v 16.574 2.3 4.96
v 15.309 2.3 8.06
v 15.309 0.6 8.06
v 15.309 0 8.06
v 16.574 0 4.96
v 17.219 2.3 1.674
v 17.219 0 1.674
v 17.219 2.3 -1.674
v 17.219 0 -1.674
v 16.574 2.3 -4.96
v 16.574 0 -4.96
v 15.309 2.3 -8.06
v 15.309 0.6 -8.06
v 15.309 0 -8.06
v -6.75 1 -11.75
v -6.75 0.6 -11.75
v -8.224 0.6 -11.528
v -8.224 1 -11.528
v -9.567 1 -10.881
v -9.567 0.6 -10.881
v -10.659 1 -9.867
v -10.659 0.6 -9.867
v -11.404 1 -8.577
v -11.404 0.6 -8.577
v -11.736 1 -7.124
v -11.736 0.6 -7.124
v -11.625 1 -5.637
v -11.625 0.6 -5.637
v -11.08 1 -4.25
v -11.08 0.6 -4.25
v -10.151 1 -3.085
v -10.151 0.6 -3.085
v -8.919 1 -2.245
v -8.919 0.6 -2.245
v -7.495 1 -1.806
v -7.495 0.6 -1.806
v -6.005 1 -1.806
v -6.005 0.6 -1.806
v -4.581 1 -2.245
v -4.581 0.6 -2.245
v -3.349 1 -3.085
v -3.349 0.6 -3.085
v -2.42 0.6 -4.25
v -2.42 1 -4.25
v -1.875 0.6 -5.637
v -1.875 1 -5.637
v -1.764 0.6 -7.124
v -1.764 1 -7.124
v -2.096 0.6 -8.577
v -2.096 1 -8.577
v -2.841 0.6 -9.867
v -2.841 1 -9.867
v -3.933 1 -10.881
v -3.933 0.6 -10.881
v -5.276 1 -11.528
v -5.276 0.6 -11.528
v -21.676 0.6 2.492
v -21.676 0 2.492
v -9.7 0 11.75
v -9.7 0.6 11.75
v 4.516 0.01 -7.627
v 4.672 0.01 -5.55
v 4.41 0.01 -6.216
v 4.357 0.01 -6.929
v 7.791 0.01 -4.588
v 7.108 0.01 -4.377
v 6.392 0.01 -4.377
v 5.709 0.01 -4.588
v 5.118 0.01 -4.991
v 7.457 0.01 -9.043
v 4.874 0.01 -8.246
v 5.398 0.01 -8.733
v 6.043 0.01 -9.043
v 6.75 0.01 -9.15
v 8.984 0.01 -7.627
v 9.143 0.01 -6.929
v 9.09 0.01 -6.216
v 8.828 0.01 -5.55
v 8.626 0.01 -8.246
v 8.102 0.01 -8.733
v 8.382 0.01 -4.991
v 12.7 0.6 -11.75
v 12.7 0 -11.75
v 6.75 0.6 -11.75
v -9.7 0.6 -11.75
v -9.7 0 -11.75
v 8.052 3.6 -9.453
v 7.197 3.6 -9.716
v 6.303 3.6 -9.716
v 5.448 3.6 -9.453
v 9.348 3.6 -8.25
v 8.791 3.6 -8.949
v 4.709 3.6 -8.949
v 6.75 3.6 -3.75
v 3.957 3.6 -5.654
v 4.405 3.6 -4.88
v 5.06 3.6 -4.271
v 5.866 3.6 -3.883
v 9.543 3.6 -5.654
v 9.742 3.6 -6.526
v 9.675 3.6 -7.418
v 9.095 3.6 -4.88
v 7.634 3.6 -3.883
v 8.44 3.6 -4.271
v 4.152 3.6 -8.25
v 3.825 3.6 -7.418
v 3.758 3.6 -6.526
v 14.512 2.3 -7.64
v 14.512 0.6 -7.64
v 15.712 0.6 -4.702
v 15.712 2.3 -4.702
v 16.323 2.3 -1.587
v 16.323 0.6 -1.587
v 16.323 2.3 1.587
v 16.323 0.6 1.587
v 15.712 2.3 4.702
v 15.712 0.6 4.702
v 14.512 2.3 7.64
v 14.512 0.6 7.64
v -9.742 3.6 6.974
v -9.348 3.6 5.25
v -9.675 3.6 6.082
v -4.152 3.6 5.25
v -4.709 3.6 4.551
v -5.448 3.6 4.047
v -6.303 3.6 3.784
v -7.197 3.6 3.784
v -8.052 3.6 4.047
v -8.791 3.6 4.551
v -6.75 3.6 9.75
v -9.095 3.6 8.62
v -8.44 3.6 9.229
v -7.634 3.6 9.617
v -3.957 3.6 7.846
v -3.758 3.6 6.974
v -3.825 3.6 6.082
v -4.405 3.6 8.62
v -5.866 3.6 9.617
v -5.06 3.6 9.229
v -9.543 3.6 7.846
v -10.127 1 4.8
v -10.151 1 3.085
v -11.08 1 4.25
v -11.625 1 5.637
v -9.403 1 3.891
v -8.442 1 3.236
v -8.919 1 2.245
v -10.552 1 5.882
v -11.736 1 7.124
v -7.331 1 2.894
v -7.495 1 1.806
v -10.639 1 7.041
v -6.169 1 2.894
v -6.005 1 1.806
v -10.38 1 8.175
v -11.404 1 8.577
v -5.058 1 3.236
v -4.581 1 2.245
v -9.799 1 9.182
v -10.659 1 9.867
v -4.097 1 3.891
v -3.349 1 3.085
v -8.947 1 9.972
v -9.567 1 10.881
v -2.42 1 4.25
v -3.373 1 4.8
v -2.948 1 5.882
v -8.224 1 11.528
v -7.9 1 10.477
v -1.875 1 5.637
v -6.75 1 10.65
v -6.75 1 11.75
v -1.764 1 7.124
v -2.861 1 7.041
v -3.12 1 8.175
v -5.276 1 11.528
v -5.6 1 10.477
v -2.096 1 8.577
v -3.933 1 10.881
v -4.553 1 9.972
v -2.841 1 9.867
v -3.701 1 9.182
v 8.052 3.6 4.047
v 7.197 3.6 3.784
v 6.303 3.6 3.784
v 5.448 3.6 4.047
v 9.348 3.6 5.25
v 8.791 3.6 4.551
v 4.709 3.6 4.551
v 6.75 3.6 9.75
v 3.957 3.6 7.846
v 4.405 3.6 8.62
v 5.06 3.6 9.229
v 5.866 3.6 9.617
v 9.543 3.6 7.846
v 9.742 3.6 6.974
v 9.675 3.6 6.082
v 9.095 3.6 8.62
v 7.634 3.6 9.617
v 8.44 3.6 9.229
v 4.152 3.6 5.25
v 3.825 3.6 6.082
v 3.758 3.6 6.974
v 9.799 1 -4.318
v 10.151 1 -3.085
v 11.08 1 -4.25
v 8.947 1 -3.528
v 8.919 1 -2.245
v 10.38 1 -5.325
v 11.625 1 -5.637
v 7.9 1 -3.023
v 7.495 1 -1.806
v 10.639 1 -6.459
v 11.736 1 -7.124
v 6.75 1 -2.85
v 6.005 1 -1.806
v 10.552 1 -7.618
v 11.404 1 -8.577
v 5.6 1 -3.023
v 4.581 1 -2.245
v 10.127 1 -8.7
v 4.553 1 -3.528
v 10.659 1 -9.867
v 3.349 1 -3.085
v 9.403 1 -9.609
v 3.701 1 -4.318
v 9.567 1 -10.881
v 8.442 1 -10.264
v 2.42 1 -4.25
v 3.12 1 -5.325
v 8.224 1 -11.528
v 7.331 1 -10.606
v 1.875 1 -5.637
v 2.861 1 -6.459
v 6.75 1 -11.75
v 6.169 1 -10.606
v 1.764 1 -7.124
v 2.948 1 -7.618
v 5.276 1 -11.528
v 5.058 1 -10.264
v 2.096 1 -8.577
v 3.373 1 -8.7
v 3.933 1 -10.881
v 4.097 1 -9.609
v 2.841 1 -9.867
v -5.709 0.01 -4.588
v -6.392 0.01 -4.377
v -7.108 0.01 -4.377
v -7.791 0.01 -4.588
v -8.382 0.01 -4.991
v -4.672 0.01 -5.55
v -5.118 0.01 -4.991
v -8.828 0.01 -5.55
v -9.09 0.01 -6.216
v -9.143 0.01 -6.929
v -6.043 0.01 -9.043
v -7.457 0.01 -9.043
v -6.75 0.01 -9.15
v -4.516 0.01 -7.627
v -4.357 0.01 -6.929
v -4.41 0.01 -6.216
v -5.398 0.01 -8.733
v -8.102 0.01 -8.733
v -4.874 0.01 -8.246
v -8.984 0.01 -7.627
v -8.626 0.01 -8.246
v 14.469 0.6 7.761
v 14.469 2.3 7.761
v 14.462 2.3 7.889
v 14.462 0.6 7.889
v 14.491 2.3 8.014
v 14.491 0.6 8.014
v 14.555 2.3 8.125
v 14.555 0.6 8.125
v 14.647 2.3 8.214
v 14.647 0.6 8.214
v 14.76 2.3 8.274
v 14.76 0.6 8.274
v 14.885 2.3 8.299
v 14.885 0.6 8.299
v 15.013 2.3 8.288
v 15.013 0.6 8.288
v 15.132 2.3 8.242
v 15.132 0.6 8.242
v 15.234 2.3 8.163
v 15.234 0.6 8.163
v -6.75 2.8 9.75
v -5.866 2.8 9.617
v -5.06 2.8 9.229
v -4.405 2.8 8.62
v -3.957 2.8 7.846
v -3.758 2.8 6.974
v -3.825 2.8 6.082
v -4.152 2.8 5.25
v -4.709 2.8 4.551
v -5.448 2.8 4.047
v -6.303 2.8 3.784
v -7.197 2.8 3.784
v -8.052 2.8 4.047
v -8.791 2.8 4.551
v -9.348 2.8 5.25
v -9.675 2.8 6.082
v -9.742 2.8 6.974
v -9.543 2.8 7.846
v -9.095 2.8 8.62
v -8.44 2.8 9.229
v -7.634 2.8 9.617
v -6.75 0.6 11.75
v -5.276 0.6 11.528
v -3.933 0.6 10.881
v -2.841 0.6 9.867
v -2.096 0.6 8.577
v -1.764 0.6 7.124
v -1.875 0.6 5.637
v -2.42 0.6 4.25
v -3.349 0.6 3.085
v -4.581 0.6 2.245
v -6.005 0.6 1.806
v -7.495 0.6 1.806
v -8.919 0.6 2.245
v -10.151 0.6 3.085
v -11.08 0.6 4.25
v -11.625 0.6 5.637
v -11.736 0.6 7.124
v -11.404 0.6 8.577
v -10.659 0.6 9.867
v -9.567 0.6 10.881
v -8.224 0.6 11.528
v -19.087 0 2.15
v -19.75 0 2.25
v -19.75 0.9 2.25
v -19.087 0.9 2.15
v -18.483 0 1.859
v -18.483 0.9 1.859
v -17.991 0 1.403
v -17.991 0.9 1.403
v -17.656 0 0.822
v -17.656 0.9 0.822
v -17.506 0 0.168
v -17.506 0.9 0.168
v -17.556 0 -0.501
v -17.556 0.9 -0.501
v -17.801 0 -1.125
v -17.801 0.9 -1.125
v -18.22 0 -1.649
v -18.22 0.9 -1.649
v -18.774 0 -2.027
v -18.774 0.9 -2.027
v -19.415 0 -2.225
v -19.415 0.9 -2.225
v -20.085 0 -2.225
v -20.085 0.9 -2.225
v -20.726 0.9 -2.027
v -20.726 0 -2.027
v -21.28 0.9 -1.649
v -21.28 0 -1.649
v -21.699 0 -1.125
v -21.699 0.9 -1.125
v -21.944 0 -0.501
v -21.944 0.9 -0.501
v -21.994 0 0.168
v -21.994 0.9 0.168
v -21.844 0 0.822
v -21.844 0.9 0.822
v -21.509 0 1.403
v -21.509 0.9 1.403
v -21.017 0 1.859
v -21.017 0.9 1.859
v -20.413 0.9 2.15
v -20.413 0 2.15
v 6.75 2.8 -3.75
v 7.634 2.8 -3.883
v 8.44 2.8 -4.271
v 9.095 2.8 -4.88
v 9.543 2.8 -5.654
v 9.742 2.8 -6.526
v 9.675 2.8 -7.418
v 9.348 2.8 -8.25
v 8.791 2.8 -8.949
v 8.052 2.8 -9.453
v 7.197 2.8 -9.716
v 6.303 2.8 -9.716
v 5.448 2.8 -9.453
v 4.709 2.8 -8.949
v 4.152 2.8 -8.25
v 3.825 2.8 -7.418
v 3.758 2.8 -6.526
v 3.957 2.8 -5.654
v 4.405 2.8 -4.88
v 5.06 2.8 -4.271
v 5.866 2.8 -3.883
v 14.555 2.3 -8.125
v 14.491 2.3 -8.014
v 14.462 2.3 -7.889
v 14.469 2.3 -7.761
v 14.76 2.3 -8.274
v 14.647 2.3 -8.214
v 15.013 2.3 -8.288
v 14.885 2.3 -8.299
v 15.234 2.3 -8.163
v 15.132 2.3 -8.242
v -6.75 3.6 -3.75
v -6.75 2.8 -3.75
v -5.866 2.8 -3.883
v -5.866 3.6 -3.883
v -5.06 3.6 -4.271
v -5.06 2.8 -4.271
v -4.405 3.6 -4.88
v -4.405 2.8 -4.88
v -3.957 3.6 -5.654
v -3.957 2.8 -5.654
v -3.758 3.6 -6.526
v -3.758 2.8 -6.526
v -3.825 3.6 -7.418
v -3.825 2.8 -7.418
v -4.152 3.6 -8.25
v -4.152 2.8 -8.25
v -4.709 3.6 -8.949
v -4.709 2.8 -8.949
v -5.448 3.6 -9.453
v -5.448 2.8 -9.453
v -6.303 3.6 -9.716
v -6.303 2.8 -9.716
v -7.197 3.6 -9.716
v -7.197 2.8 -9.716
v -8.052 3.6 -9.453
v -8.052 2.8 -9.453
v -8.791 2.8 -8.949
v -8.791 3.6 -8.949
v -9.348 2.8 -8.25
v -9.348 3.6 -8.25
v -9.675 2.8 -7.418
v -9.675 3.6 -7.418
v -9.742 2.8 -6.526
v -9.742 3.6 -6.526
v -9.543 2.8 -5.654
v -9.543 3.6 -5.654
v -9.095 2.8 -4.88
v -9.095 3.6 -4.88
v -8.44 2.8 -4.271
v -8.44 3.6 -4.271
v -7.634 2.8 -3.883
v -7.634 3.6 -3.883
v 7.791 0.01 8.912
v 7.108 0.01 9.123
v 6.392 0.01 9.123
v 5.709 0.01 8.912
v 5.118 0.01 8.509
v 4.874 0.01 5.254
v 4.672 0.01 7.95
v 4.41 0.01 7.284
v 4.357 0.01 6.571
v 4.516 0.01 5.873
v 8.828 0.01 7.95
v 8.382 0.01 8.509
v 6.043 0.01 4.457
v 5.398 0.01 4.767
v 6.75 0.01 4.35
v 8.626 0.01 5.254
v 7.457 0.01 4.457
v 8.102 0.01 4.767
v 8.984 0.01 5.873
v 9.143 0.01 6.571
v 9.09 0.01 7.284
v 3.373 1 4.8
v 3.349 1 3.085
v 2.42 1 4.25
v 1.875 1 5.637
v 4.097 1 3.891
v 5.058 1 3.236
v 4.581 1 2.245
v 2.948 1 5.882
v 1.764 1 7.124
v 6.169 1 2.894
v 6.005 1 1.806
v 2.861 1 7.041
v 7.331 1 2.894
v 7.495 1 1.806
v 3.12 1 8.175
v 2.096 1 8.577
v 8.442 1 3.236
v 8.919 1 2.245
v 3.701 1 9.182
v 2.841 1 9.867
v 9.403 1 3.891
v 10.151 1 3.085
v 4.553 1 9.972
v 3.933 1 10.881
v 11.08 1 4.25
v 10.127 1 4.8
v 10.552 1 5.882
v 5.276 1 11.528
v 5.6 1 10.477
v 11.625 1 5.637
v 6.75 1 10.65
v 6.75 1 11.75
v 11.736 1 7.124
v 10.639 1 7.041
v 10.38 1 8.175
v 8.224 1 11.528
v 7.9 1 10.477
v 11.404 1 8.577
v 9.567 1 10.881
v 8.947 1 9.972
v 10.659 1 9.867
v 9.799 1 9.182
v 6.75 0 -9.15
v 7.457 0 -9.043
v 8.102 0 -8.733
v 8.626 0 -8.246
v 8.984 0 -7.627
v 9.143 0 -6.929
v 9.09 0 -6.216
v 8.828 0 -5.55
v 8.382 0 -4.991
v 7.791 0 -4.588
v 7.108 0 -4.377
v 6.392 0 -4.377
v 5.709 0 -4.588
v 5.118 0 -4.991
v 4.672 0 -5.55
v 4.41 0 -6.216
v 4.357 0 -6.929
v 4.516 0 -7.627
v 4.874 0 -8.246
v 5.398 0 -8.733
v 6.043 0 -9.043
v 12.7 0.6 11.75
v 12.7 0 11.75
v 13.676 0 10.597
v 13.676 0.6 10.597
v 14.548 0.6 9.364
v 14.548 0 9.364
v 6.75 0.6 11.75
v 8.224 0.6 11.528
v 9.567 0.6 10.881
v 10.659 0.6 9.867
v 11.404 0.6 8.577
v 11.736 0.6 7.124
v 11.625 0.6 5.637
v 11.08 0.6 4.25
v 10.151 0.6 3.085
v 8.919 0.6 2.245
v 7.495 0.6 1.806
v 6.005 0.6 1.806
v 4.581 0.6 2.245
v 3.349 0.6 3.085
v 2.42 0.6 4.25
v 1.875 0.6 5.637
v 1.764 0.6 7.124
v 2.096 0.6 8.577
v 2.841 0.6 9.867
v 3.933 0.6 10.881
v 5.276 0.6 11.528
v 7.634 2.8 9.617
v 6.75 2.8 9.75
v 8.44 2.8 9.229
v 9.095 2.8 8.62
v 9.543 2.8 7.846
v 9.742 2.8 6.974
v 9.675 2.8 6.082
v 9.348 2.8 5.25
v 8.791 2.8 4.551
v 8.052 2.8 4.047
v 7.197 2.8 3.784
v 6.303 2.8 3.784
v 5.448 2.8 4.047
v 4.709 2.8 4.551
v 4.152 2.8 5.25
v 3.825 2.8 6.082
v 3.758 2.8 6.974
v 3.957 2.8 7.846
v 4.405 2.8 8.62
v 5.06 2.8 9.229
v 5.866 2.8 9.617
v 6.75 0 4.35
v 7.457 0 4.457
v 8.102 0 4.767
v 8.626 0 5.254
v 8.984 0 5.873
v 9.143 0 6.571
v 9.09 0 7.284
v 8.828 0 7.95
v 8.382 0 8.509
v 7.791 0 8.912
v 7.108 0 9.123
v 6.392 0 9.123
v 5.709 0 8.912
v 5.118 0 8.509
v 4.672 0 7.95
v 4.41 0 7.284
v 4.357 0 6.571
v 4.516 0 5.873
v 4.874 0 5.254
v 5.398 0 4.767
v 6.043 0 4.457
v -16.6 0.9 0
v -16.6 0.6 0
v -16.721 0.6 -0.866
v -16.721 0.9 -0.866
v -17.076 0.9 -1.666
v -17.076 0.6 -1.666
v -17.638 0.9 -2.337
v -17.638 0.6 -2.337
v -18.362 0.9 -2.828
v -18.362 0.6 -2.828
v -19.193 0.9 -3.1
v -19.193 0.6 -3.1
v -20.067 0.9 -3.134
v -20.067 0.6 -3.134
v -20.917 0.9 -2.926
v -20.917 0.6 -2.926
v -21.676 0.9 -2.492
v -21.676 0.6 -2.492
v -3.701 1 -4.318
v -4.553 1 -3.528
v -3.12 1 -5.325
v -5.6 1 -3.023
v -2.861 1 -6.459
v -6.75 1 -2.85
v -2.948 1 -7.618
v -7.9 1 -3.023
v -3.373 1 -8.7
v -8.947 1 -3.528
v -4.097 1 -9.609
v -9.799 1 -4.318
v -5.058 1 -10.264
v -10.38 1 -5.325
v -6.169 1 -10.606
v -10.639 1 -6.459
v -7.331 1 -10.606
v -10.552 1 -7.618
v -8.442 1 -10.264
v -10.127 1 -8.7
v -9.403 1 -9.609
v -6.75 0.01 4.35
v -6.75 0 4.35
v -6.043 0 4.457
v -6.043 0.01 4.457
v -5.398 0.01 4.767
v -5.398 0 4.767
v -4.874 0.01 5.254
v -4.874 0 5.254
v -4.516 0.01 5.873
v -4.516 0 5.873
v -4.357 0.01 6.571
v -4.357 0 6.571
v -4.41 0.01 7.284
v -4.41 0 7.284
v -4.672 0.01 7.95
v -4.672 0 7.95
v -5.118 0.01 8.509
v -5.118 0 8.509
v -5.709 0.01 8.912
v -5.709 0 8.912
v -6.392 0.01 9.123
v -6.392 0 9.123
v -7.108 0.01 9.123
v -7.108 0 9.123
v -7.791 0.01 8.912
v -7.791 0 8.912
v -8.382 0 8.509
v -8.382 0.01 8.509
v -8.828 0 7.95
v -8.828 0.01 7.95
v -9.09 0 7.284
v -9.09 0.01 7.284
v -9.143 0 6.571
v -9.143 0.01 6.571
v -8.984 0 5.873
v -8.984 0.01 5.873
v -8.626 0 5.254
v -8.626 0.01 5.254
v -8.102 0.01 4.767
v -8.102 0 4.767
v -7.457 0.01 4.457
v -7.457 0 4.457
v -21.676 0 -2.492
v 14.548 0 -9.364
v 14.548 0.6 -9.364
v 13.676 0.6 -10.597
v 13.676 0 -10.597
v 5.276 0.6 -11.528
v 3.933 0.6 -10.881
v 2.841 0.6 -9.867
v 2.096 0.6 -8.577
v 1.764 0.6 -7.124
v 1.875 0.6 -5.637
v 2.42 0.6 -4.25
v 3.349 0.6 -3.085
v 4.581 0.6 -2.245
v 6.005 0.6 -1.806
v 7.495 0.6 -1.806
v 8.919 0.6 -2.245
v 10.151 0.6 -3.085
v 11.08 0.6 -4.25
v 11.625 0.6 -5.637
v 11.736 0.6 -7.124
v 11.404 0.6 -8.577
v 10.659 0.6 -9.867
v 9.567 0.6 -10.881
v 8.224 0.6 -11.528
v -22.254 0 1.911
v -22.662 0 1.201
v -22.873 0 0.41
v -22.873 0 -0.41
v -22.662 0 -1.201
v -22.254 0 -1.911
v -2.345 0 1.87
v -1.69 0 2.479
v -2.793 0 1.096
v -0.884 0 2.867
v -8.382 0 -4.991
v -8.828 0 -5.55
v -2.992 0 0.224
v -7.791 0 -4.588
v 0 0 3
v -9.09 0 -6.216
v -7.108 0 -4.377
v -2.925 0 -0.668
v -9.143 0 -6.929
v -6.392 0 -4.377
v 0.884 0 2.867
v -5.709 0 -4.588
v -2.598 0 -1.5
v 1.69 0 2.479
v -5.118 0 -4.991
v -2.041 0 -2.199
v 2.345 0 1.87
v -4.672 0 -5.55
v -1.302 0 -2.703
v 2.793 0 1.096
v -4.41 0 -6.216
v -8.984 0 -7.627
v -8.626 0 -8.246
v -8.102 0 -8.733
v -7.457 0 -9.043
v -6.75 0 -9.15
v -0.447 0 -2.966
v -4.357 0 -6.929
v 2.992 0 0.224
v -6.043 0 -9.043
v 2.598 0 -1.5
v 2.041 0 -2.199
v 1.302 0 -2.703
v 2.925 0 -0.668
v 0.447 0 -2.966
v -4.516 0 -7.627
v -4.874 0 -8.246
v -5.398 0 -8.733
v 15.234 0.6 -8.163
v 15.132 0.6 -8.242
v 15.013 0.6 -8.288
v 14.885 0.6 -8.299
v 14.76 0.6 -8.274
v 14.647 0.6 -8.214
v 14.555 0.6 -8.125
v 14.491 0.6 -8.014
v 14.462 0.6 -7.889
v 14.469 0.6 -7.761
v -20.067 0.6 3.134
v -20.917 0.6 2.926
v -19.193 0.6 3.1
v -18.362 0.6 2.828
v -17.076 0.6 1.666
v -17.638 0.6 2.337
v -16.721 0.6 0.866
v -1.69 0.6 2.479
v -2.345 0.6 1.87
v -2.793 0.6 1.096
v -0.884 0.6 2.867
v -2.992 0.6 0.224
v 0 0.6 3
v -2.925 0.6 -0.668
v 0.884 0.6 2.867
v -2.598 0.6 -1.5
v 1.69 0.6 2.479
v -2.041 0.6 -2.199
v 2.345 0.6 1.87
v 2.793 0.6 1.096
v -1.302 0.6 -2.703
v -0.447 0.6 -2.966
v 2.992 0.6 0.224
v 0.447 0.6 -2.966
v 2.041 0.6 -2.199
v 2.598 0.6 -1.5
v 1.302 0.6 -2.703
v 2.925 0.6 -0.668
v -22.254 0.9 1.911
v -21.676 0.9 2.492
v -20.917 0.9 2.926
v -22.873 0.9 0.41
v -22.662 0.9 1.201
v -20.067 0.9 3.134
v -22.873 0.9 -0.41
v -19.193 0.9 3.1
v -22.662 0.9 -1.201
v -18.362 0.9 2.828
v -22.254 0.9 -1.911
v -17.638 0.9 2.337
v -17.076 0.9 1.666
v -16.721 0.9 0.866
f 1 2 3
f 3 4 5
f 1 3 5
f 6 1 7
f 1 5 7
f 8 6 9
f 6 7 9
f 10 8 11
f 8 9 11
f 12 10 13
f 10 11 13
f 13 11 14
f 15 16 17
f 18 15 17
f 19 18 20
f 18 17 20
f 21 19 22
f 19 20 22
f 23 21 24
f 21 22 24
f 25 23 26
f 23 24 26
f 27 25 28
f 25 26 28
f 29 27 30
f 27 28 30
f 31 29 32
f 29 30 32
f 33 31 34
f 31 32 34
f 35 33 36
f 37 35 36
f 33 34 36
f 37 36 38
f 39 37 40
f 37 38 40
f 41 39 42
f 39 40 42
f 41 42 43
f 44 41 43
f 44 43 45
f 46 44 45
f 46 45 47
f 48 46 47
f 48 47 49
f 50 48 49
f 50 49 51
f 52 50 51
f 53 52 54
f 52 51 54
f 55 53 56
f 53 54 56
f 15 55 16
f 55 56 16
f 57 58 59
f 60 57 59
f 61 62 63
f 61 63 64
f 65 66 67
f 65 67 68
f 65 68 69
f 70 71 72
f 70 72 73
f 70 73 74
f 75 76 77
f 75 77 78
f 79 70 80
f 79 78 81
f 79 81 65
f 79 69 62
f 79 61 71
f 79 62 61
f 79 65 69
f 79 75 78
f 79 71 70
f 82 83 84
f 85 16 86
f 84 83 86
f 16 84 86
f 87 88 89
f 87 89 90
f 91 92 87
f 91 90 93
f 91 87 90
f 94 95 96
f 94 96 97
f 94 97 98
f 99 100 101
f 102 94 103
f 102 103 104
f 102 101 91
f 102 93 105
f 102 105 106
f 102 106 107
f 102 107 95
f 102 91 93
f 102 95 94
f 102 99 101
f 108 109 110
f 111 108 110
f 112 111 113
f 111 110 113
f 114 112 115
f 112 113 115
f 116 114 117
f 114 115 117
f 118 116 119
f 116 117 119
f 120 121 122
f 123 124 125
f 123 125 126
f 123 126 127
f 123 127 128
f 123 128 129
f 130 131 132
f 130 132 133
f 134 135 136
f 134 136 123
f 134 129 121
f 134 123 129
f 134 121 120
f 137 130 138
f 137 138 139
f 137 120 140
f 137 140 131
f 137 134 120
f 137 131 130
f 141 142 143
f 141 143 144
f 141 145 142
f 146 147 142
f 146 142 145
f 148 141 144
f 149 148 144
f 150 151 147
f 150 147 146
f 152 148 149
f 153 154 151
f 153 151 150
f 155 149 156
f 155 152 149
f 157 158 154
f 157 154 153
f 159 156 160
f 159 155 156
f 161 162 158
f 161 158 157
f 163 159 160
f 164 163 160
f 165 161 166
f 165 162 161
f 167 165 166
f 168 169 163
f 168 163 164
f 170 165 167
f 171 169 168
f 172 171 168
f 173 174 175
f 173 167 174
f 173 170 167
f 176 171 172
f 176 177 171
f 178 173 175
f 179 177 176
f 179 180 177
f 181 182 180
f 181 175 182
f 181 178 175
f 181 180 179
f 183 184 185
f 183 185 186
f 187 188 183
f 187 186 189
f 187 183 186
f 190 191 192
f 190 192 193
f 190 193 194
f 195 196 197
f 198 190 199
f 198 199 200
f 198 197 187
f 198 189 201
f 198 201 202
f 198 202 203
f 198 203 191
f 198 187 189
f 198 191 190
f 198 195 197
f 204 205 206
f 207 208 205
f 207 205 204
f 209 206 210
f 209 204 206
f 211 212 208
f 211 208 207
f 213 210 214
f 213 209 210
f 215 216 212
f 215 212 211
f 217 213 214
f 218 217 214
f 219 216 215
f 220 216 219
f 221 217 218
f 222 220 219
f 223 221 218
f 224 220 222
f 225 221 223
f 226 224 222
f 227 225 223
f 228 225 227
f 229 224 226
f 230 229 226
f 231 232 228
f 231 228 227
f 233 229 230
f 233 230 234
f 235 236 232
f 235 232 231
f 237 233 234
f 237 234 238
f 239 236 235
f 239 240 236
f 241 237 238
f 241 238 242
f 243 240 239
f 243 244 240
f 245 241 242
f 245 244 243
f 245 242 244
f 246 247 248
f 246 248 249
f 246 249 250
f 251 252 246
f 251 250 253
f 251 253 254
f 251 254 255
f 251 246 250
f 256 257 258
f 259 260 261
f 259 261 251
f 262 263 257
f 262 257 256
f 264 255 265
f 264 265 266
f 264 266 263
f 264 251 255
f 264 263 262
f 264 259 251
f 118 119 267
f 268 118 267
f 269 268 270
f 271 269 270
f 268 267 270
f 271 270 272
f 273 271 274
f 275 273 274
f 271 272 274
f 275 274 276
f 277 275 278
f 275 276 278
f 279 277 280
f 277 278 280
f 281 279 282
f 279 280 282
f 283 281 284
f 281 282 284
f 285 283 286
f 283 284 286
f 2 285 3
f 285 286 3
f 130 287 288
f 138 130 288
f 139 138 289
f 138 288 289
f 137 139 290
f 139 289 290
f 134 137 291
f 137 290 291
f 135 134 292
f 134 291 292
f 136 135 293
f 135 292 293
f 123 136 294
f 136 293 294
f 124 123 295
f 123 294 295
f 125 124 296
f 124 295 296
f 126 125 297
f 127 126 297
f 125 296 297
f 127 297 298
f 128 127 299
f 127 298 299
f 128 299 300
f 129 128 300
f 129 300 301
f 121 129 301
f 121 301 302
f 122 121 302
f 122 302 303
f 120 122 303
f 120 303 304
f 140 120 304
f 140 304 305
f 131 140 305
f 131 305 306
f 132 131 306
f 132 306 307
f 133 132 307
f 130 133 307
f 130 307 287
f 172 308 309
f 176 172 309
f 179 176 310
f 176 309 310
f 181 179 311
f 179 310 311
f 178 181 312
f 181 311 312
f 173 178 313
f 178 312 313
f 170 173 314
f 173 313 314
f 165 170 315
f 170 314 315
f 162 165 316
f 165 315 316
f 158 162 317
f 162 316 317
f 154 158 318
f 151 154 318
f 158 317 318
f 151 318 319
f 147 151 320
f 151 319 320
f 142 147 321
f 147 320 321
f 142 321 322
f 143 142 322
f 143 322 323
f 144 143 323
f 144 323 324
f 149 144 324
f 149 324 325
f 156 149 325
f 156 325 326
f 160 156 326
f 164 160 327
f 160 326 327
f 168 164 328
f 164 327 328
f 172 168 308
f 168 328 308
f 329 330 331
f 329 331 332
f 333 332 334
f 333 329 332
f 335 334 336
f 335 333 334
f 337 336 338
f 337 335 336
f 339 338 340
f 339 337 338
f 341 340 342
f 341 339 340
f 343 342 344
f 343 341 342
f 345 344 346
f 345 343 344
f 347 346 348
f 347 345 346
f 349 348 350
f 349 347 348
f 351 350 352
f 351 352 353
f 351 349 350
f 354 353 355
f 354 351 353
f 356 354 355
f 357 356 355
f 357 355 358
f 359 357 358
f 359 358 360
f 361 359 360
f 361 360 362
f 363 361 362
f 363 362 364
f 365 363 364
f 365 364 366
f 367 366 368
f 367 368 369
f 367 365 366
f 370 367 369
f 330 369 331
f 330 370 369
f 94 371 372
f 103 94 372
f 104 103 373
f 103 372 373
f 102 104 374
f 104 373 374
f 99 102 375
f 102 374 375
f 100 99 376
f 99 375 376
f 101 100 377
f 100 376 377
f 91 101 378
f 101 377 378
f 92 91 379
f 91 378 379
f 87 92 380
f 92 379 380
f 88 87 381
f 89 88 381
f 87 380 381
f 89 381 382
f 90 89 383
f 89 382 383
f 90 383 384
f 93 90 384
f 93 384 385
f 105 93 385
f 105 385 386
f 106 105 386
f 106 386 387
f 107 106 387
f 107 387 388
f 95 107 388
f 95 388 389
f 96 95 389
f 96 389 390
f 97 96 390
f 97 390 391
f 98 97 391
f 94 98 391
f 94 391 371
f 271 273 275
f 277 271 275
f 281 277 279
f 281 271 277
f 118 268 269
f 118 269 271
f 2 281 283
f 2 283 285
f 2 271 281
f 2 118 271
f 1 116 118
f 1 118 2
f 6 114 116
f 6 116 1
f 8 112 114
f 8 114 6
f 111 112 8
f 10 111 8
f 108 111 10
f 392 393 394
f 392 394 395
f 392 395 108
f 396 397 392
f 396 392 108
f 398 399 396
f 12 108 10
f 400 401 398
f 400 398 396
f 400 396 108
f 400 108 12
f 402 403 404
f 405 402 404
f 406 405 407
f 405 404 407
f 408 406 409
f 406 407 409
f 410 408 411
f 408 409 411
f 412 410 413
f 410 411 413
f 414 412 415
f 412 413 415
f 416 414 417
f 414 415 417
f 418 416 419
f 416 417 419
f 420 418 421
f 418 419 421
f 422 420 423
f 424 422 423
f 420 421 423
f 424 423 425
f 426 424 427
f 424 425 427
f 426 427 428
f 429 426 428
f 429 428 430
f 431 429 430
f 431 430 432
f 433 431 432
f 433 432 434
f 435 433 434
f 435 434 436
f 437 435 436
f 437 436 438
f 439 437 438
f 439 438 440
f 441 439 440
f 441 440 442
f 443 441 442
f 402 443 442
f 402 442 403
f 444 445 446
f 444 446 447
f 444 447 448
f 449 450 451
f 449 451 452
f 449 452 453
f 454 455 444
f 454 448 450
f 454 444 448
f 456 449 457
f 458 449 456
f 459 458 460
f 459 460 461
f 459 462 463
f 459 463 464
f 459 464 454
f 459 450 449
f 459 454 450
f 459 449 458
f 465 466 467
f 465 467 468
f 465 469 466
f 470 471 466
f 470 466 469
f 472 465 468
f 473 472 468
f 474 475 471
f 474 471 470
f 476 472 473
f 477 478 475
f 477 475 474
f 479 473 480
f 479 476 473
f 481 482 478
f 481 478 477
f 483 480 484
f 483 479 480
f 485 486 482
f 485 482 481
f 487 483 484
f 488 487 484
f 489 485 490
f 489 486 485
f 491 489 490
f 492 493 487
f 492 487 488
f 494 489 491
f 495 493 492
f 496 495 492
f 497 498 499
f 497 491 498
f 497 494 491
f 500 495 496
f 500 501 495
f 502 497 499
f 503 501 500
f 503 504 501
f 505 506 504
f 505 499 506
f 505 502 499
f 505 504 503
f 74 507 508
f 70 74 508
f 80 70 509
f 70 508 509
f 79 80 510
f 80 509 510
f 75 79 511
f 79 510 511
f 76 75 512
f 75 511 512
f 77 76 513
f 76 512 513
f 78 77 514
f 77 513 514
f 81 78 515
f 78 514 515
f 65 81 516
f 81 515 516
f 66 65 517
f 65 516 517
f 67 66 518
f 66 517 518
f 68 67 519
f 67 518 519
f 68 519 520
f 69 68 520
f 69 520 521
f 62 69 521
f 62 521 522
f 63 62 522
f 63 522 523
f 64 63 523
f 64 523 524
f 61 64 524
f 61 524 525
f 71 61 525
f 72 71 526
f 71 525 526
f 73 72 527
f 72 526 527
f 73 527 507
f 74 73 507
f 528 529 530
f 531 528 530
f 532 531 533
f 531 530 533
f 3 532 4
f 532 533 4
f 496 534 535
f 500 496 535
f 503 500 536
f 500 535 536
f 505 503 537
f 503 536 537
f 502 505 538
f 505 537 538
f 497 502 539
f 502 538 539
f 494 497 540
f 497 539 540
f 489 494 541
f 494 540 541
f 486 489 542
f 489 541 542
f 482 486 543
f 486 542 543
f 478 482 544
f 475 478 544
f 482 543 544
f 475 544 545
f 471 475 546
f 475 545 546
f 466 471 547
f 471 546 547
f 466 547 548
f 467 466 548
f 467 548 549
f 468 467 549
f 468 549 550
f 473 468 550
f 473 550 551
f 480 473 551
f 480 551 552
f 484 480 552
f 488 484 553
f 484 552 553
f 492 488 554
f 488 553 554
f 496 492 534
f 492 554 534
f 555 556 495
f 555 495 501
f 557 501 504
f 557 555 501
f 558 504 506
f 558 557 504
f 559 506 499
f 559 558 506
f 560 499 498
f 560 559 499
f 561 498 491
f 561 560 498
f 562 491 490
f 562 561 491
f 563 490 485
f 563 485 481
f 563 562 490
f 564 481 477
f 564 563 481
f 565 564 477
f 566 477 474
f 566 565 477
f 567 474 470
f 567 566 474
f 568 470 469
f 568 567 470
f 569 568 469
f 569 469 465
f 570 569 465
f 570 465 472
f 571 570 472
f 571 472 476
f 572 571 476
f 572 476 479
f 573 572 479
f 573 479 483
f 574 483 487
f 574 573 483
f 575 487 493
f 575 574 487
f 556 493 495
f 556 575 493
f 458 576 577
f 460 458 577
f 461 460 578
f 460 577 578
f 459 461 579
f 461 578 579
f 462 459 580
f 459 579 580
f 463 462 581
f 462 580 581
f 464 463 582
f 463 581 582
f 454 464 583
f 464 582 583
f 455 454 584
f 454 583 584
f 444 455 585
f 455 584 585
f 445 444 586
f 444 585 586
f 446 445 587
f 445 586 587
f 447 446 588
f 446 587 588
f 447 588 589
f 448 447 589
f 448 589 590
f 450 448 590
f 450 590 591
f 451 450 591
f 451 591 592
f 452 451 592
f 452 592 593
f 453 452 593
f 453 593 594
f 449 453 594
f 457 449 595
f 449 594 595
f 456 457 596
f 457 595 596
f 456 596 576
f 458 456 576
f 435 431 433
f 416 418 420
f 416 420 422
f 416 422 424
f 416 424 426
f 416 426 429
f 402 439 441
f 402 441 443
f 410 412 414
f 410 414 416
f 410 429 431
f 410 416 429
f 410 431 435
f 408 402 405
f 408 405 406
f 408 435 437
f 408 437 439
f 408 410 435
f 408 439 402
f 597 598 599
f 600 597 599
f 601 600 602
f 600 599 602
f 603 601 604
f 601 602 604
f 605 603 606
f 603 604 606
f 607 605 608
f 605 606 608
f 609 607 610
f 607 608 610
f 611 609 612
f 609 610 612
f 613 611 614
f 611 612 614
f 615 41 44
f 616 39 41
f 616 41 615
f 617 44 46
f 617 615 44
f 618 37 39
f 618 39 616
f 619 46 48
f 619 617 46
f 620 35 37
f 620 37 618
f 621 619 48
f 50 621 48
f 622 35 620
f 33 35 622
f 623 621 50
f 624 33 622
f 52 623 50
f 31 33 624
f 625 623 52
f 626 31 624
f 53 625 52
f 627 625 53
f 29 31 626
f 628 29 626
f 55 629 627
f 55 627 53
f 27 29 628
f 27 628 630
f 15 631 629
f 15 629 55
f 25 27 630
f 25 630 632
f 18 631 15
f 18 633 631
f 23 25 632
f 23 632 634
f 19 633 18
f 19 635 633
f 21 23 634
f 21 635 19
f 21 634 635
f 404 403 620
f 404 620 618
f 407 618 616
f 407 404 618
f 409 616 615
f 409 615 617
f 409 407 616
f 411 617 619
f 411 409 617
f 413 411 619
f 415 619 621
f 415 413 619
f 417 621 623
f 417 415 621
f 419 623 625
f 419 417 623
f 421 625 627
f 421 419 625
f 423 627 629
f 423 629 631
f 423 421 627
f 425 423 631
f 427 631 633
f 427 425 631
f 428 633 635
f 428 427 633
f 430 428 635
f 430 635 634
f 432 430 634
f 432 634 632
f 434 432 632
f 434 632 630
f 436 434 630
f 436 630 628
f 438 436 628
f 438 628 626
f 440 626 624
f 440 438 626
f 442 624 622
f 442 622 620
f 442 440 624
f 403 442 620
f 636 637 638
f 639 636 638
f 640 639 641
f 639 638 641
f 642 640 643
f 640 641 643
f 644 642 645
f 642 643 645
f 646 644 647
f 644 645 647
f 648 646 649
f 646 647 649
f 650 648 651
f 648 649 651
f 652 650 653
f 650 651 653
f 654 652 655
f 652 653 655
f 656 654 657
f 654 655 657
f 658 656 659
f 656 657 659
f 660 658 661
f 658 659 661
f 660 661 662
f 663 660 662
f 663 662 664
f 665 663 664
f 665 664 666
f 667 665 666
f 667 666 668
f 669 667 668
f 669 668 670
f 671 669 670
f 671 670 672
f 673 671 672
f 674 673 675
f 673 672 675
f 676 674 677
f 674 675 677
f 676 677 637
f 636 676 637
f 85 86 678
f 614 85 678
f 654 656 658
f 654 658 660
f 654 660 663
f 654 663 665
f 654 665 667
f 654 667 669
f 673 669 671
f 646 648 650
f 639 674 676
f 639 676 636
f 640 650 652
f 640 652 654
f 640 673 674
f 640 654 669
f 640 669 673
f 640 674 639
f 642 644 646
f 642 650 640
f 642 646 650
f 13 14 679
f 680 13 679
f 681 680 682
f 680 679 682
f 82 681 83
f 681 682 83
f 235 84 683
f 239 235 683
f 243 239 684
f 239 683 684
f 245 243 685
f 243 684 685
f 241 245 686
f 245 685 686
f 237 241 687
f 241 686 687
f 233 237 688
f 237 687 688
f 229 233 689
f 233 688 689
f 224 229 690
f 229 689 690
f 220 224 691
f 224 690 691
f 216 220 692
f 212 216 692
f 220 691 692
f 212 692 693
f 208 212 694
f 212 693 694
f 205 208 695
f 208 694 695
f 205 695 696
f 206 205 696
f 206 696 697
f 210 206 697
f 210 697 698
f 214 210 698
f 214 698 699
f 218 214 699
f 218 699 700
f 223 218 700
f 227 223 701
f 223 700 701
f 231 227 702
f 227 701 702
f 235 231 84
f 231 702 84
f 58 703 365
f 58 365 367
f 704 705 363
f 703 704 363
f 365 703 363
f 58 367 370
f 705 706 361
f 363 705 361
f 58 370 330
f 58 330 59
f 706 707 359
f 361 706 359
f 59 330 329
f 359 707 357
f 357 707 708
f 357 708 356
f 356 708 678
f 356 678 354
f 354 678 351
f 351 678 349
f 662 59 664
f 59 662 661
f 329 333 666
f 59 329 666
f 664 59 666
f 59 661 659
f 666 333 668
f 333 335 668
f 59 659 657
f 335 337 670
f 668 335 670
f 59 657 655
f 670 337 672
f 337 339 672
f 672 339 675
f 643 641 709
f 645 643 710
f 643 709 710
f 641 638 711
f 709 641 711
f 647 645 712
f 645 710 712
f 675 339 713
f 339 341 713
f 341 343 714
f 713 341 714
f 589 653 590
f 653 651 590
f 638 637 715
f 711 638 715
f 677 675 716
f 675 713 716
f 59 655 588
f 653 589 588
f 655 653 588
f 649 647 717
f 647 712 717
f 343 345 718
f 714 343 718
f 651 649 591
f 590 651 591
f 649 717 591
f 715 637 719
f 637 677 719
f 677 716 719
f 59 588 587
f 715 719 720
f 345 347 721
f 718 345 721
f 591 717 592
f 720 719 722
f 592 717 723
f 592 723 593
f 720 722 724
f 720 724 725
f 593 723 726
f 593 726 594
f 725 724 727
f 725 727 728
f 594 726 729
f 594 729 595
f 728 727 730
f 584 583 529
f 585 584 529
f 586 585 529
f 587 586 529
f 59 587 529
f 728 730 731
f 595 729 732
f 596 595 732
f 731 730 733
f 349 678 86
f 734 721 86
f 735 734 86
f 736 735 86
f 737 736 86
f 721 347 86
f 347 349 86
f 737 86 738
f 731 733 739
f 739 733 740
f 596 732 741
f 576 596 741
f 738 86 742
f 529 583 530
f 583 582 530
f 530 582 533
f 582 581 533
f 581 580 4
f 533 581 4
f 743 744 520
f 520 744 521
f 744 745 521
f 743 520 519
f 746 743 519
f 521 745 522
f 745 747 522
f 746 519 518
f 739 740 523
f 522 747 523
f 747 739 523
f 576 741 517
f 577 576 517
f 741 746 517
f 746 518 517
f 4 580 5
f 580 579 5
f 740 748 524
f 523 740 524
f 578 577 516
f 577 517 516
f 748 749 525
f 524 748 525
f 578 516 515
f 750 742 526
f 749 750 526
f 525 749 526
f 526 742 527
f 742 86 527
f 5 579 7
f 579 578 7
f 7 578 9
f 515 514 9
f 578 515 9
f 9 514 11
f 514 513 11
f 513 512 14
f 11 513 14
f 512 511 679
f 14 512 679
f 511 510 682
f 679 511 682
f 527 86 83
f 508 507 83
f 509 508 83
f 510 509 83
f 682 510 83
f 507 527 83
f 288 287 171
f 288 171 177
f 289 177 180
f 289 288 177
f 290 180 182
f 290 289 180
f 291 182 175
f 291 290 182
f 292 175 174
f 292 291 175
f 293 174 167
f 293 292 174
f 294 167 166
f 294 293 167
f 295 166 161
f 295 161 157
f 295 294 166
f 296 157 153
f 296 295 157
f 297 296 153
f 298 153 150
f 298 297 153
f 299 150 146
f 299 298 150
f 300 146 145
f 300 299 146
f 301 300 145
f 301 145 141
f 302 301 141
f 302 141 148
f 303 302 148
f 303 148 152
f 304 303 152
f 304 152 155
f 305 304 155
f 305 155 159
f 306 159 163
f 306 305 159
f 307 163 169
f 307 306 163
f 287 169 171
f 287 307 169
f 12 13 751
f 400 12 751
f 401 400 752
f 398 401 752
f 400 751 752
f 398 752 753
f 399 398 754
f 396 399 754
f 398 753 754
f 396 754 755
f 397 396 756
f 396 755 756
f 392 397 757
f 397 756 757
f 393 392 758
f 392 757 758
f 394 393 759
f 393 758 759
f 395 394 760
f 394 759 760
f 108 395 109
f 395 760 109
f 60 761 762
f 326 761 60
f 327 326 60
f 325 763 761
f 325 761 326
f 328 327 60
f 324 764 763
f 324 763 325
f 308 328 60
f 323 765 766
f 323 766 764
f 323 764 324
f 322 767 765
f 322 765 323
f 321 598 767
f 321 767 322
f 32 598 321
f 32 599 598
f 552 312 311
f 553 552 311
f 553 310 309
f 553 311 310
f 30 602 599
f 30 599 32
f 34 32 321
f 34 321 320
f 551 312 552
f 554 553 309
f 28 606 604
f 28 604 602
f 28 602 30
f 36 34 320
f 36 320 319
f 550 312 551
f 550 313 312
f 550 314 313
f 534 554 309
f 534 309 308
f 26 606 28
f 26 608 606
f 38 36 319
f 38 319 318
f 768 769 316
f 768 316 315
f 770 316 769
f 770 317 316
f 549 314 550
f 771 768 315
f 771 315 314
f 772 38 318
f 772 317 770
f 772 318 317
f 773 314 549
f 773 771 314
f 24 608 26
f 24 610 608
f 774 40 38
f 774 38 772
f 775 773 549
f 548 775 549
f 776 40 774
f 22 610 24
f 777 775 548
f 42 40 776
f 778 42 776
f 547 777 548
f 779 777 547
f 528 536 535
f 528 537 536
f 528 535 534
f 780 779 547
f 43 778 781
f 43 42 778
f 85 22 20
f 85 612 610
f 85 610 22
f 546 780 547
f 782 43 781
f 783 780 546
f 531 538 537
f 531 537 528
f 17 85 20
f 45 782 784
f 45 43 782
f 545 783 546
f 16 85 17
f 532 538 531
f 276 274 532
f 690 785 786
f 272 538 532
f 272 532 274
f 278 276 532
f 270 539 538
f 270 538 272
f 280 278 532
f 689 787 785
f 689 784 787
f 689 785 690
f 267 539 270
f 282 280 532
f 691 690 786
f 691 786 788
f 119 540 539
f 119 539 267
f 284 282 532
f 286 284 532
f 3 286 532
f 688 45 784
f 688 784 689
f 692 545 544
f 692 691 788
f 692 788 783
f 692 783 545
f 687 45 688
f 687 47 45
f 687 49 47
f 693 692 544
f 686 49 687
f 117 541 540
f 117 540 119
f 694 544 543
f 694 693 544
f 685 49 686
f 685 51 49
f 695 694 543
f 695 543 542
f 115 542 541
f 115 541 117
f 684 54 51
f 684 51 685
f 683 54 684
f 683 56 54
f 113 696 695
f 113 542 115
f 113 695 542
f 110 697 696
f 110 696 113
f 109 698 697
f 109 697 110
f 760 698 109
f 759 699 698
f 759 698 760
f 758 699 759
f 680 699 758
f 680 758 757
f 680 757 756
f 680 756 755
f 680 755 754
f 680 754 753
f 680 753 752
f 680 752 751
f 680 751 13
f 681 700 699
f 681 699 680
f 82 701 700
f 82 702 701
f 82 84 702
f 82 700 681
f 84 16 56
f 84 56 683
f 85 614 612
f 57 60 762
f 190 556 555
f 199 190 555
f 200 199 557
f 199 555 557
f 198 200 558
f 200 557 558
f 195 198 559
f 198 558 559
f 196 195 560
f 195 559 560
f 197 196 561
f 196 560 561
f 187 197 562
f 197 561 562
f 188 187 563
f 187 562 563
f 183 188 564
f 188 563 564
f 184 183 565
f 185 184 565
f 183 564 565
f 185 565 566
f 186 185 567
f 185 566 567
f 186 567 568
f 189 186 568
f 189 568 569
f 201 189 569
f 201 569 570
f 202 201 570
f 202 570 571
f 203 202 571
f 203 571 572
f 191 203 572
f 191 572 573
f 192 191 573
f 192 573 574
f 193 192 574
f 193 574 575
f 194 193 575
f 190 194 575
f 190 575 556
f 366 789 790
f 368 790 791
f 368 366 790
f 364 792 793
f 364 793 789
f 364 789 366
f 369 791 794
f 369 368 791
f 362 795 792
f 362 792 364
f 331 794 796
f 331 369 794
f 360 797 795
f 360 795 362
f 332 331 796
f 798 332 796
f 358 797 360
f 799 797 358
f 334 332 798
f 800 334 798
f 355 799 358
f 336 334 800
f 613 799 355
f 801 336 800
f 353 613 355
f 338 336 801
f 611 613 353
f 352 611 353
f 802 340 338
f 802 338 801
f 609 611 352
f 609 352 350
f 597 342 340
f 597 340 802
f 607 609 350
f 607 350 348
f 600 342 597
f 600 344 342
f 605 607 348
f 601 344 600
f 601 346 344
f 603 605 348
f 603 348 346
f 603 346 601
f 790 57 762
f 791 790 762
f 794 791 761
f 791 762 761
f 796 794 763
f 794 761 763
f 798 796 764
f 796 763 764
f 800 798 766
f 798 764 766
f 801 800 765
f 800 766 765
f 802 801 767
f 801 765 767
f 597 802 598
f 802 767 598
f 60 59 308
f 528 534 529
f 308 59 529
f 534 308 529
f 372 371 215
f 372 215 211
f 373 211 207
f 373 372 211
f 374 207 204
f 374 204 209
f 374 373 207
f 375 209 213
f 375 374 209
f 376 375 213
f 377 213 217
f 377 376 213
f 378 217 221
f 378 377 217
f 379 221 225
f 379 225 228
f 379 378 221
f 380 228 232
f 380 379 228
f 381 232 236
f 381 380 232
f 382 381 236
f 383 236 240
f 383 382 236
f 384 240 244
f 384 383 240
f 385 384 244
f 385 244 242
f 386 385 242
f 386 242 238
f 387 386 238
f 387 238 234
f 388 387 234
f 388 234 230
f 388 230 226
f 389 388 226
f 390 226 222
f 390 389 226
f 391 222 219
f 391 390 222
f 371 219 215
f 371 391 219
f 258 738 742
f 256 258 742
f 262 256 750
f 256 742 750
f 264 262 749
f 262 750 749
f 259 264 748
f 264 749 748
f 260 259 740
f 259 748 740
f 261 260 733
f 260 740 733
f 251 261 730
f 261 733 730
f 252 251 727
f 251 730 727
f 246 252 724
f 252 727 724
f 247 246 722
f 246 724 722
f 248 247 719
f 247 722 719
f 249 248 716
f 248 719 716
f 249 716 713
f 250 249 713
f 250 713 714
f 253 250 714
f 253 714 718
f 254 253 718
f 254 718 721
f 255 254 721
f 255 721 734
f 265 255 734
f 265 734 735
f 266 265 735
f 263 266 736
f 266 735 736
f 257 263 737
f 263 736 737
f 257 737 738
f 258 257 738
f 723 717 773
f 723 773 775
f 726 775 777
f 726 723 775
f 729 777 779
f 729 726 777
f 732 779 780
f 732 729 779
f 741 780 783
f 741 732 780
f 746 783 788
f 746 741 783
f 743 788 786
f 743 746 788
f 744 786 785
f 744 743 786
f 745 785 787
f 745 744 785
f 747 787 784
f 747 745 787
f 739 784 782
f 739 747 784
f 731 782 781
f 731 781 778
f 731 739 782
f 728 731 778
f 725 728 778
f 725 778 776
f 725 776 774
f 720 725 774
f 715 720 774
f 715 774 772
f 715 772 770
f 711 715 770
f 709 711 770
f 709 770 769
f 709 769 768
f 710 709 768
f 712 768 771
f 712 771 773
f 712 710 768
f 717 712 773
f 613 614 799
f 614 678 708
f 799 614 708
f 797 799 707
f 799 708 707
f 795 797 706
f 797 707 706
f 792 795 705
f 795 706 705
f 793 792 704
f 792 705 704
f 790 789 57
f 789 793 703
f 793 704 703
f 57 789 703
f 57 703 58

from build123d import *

# Parameters (mm, degrees)
ESQUISSE1_R             = 3
SUPPORT_DEPTH           = 0.6
ESQUISSE1_4_R           = 2.25
FIXATION_DEPTH          = 0.9
LANGUETTE_DEPTH         = 2.3
ESQUISSE2_R             = 5
ESQUISSE2_R_2           = 4
SEMELLE_DEPTH           = 0.4
ESQUISSE2_4_R           = 3
BOUTONS_DEPTH           = 3
ESQUISSE2_5_R           = 4
ESQUISSE2_5_R_2         = 3
BORDURE_DEPTH           = 2.2
CHANFREIN_SIZE          = 2
CHANFREIN_SIZE_2        = 1
ESQUISSE3_R             = 2.4
ENL_V_MAT_EXTRU_1_DEPTH = 0.01


with BuildPart() as part:
    # Esquisse1 → Support (new body)
    with BuildSketch(Plane(origin=(0, 0, 0), x_dir=(1, 0, 0), z_dir=(0, 1, 0))):
        with BuildLine():
            Line((12.7, 11.75), (-9.7, 11.75))
            Line((-9.7, 11.75), (-21.676479721, 2.492223081))
            ThreePointArc((-21.676479721, 2.492223081), (-18.361819738, 2.82762366), (-16.6, 0))
            ThreePointArc((-16.6, 0), (-18.361819738, -2.82762366), (-21.676479721, -2.492223081))
            Line((-21.676479721, -2.492223081), (-9.7, -11.75))
            Line((-9.7, -11.75), (12.7, -11.75))
            ThreePointArc((12.7, -11.75), (14.125401288, -9.990303879), (15.308839134, -8.059559428))
            ThreePointArc((15.308839134, -8.059559428), (14.701052578, -8.248227129), (14.512384877, -7.640440572))
            ThreePointArc((14.512384877, -7.640440572), (16.4, 0), (14.512384877, 7.640440572))
            ThreePointArc((14.512384877, 7.640440572), (14.701052578, 8.248227129), (15.308839134, 8.059559428))
            ThreePointArc((15.308839134, 8.059559428), (14.125401288, 9.990303879), (12.7, 11.75))
        make_face()
        with Locations(Location((0, 0, 0), (0, 0, 270))):
            Circle(ESQUISSE1_R, mode=Mode.SUBTRACT)
    extrude(amount=SUPPORT_DEPTH)

    # Esquisse1<4> → Fixation (add)
    with BuildSketch(Plane(origin=(0, 0, 0), x_dir=(1, 0, 0), z_dir=(0, 1, 0))):
        with BuildLine():
            ThreePointArc((-16.6, 0), (-18.361819738, 2.82762366), (-21.676479721, 2.492223081))
            ThreePointArc((-21.676479721, 2.492223081), (-22.9, 0), (-21.676479721, -2.492223081))
            ThreePointArc((-21.676479721, -2.492223081), (-18.361819738, -2.82762366), (-16.6, 0))
        make_face()
        with Locations(Location((-19.75, 0, 0), (0, 0, 270))):
            Circle(ESQUISSE1_4_R, mode=Mode.SUBTRACT)
    extrude(amount=FIXATION_DEPTH)

    # Esquisse1<5> → Languette (add)
    with BuildSketch(Plane(origin=(0, 0, 0), x_dir=(1, 0, 0), z_dir=(0, 1, 0))):
        with BuildLine():
            ThreePointArc((15.308839134, -8.059559428), (17.3, 0), (15.308839134, 8.059559428))
            ThreePointArc((15.308839134, 8.059559428), (14.701052578, 8.248227129), (14.512384877, 7.640440572))
            ThreePointArc((14.512384877, 7.640440572), (16.4, 0), (14.512384877, -7.640440572))
            ThreePointArc((14.512384877, -7.640440572), (14.701052578, -8.248227129), (15.308839134, -8.059559428))
        make_face()
    extrude(amount=LANGUETTE_DEPTH)

    # Esquisse2 → Semelle (add)
    # profile 1 of 4: a face of its own
    with BuildSketch(Plane(origin=(0, 0.6, 0), x_dir=(1, 0, 0), z_dir=(0, 1, 0))):
        with Locations(Location((-6.75, 6.75, 0), (0, 0, 90))):
            Circle(ESQUISSE2_R)
        with Locations(Location((-6.75, 6.75, 0), (0, 0, 270))):
            Circle(ESQUISSE2_R_2, mode=Mode.SUBTRACT)
    # profile 2 of 4: a face of its own
    with BuildSketch(Plane(origin=(0, 0.6, 0), x_dir=(1, 0, 0), z_dir=(0, 1, 0))):
        with Locations(Location((6.75, 6.75, 0), (0, 0, 90))):
            Circle(ESQUISSE2_R)
        with Locations(Location((6.75, 6.75, 0), (0, 0, 270))):
            Circle(ESQUISSE2_R_2, mode=Mode.SUBTRACT)
    # profile 3 of 4: a face of its own
    with BuildSketch(Plane(origin=(0, 0.6, 0), x_dir=(1, 0, 0), z_dir=(0, 1, 0))):
        with Locations(Location((6.75, -6.75, 0), (0, 0, 270))):
            Circle(ESQUISSE2_R)
        with Locations(Location((6.75, -6.75, 0), (0, 0, 270))):
            Circle(ESQUISSE2_R_2, mode=Mode.SUBTRACT)
    # profile 4 of 4: a face of its own
    with BuildSketch(Plane(origin=(0, 0.6, 0), x_dir=(1, 0, 0), z_dir=(0, 1, 0))):
        with Locations(Location((-6.75, -6.75, 0), (0, 0, 270))):
            Circle(ESQUISSE2_R)
        with Locations(Location((-6.75, -6.75, 0), (0, 0, 270))):
            Circle(ESQUISSE2_R_2, mode=Mode.SUBTRACT)
    extrude(amount=SEMELLE_DEPTH)

    # Esquisse2<4> → Boutons (add)
    with BuildSketch(Plane(origin=(0, 0.6, 0), x_dir=(1, 0, 0), z_dir=(0, 1, 0))):
        with Locations(Location((-6.75, 6.75, 0), (0, 0, 270))):
            Circle(ESQUISSE2_4_R)
        with Locations(Location((6.75, 6.75, 0), (0, 0, 270))):
            Circle(ESQUISSE2_4_R)
        with Locations(Location((6.75, -6.75, 0), (0, 0, 270))):
            Circle(ESQUISSE2_4_R)
        with Locations(Location((-6.75, -6.75, 0), (0, 0, 270))):
            Circle(ESQUISSE2_4_R)
    extrude(amount=BOUTONS_DEPTH)

    # Esquisse2<5> → Bordure (add)
    # profile 1 of 4: a face of its own
    with BuildSketch(Plane(origin=(0, 0.6, 0), x_dir=(1, 0, 0), z_dir=(0, 1, 0))):
        with Locations(Location((-6.75, 6.75, 0), (0, 0, 270))):
            Circle(ESQUISSE2_5_R)
        with Locations(Location((-6.75, 6.75, 0), (0, 0, 270))):
            Circle(ESQUISSE2_5_R_2, mode=Mode.SUBTRACT)
    # profile 2 of 4: a face of its own
    with BuildSketch(Plane(origin=(0, 0.6, 0), x_dir=(1, 0, 0), z_dir=(0, 1, 0))):
        with Locations(Location((6.75, 6.75, 0), (0, 0, 270))):
            Circle(ESQUISSE2_5_R)
        with Locations(Location((6.75, 6.75, 0), (0, 0, 270))):
            Circle(ESQUISSE2_5_R_2, mode=Mode.SUBTRACT)
    # profile 3 of 4: a face of its own
    with BuildSketch(Plane(origin=(0, 0.6, 0), x_dir=(1, 0, 0), z_dir=(0, 1, 0))):
        with Locations(Location((-6.75, -6.75, 0), (0, 0, 270))):
            Circle(ESQUISSE2_5_R)
        with Locations(Location((-6.75, -6.75, 0), (0, 0, 270))):
            Circle(ESQUISSE2_5_R_2, mode=Mode.SUBTRACT)
    # profile 4 of 4: a face of its own
    with BuildSketch(Plane(origin=(0, 0.6, 0), x_dir=(1, 0, 0), z_dir=(0, 1, 0))):
        with Locations(Location((6.75, -6.75, 0), (0, 0, 270))):
            Circle(ESQUISSE2_5_R)
        with Locations(Location((6.75, -6.75, 0), (0, 0, 270))):
            Circle(ESQUISSE2_5_R_2, mode=Mode.SUBTRACT)
    extrude(amount=BORDURE_DEPTH)

    # Chanfrein
    # the kernel refuses this chamfer: 2, 1 mm, written as the material it takes off along each edge
    with BuildSketch(Plane(origin=(6.75, 2.8, -6.75), x_dir=(0, 0, 1), z_dir=(-1, 0, 0))) as chanfrein_piece_1_section:
        Polygon((4, -CHANFREIN_SIZE), (4 - CHANFREIN_SIZE_2, 0), (4, 0), align=None)
    chanfrein_piece_1 = revolve(axis=Axis((6.75, 2.8, -6.75), (0, 1, 0)), mode=Mode.PRIVATE)
    chanfrein_piece_1 = split(chanfrein_piece_1, bisect_by=Plane(origin=(6.75, 1, -10.226430856), z_dir=(0, 1, 0)), keep=Keep.TOP, mode=Mode.PRIVATE)
    chanfrein_piece_1 = chanfrein_piece_1 - Plane(origin=(6.75, 1.913215428, -6.75), x_dir=(0, 0, 1), z_dir=(0, -1, 0)) * Cylinder(3, 16, mode=Mode.PRIVATE)
    add(chanfrein_piece_1, mode=Mode.SUBTRACT)
    with BuildSketch(Plane(origin=(6.75, 2.8, 6.75), x_dir=(0, 0, 1), z_dir=(-1, 0, 0))) as chanfrein_piece_2_section:
        Polygon((4, -CHANFREIN_SIZE), (4 - CHANFREIN_SIZE_2, 0), (4, 0), align=None)
    chanfrein_piece_2 = revolve(axis=Axis((6.75, 2.8, 6.75), (0, 1, 0)), mode=Mode.PRIVATE)
    chanfrein_piece_2 = split(chanfrein_piece_2, bisect_by=Plane(origin=(6.75, 1, 3.273569144), z_dir=(0, 1, 0)), keep=Keep.TOP, mode=Mode.PRIVATE)
    chanfrein_piece_2 = chanfrein_piece_2 - Plane(origin=(6.75, 1.913215428, 6.75), x_dir=(0, 0, 1), z_dir=(0, -1, 0)) * Cylinder(3, 16, mode=Mode.PRIVATE)
    add(chanfrein_piece_2, mode=Mode.SUBTRACT)
    with BuildSketch(Plane(origin=(-6.75, 2.8, 6.75), x_dir=(0, 0, 1), z_dir=(-1, 0, 0))) as chanfrein_piece_3_section:
        Polygon((4, -CHANFREIN_SIZE), (4 - CHANFREIN_SIZE_2, 0), (4, 0), align=None)
    chanfrein_piece_3 = revolve(axis=Axis((-6.75, 2.8, 6.75), (0, 1, 0)), mode=Mode.PRIVATE)
    chanfrein_piece_3 = split(chanfrein_piece_3, bisect_by=Plane(origin=(-6.75, 1, 3.273569144), z_dir=(0, 1, 0)), keep=Keep.TOP, mode=Mode.PRIVATE)
    chanfrein_piece_3 = chanfrein_piece_3 - Plane(origin=(-6.75, 1.913215428, 6.75), x_dir=(0, 0, 1), z_dir=(0, -1, 0)) * Cylinder(3, 16, mode=Mode.PRIVATE)
    add(chanfrein_piece_3, mode=Mode.SUBTRACT)
    with BuildSketch(Plane(origin=(-6.75, 2.8, -6.75), x_dir=(0, 0, 1), z_dir=(-1, 0, 0))) as chanfrein_piece_4_section:
        Polygon((4, -CHANFREIN_SIZE), (4 - CHANFREIN_SIZE_2, 0), (4, 0), align=None)
    chanfrein_piece_4 = revolve(axis=Axis((-6.75, 2.8, -6.75), (0, 1, 0)), mode=Mode.PRIVATE)
    chanfrein_piece_4 = split(chanfrein_piece_4, bisect_by=Plane(origin=(-6.75, 1, -10.226430856), z_dir=(0, 1, 0)), keep=Keep.TOP, mode=Mode.PRIVATE)
    chanfrein_piece_4 = chanfrein_piece_4 - Plane(origin=(-6.75, 1.913215428, -6.75), x_dir=(0, 0, 1), z_dir=(0, -1, 0)) * Cylinder(3, 16, mode=Mode.PRIVATE)
    add(chanfrein_piece_4, mode=Mode.SUBTRACT)

    # Esquisse3 → Enlèv. mat.-Extru.1 (cut)
    with BuildSketch(Plane.XZ):
        with Locations(Location((6.75, -6.75, 0), (0, 0, 270))):
            Circle(ESQUISSE3_R)
        with Locations(Location((-6.75, -6.75, 0), (0, 0, 270))):
            Circle(ESQUISSE3_R)
        with Locations(Location((6.75, 6.75, 0), (0, 0, 270))):
            Circle(ESQUISSE3_R)
        with Locations(Location((-6.75, 6.75, 0), (0, 0, 270))):
            Circle(ESQUISSE3_R)
    extrude(amount=-ENL_V_MAT_EXTRU_1_DEPTH, mode=Mode.SUBTRACT)


solid = part.part
